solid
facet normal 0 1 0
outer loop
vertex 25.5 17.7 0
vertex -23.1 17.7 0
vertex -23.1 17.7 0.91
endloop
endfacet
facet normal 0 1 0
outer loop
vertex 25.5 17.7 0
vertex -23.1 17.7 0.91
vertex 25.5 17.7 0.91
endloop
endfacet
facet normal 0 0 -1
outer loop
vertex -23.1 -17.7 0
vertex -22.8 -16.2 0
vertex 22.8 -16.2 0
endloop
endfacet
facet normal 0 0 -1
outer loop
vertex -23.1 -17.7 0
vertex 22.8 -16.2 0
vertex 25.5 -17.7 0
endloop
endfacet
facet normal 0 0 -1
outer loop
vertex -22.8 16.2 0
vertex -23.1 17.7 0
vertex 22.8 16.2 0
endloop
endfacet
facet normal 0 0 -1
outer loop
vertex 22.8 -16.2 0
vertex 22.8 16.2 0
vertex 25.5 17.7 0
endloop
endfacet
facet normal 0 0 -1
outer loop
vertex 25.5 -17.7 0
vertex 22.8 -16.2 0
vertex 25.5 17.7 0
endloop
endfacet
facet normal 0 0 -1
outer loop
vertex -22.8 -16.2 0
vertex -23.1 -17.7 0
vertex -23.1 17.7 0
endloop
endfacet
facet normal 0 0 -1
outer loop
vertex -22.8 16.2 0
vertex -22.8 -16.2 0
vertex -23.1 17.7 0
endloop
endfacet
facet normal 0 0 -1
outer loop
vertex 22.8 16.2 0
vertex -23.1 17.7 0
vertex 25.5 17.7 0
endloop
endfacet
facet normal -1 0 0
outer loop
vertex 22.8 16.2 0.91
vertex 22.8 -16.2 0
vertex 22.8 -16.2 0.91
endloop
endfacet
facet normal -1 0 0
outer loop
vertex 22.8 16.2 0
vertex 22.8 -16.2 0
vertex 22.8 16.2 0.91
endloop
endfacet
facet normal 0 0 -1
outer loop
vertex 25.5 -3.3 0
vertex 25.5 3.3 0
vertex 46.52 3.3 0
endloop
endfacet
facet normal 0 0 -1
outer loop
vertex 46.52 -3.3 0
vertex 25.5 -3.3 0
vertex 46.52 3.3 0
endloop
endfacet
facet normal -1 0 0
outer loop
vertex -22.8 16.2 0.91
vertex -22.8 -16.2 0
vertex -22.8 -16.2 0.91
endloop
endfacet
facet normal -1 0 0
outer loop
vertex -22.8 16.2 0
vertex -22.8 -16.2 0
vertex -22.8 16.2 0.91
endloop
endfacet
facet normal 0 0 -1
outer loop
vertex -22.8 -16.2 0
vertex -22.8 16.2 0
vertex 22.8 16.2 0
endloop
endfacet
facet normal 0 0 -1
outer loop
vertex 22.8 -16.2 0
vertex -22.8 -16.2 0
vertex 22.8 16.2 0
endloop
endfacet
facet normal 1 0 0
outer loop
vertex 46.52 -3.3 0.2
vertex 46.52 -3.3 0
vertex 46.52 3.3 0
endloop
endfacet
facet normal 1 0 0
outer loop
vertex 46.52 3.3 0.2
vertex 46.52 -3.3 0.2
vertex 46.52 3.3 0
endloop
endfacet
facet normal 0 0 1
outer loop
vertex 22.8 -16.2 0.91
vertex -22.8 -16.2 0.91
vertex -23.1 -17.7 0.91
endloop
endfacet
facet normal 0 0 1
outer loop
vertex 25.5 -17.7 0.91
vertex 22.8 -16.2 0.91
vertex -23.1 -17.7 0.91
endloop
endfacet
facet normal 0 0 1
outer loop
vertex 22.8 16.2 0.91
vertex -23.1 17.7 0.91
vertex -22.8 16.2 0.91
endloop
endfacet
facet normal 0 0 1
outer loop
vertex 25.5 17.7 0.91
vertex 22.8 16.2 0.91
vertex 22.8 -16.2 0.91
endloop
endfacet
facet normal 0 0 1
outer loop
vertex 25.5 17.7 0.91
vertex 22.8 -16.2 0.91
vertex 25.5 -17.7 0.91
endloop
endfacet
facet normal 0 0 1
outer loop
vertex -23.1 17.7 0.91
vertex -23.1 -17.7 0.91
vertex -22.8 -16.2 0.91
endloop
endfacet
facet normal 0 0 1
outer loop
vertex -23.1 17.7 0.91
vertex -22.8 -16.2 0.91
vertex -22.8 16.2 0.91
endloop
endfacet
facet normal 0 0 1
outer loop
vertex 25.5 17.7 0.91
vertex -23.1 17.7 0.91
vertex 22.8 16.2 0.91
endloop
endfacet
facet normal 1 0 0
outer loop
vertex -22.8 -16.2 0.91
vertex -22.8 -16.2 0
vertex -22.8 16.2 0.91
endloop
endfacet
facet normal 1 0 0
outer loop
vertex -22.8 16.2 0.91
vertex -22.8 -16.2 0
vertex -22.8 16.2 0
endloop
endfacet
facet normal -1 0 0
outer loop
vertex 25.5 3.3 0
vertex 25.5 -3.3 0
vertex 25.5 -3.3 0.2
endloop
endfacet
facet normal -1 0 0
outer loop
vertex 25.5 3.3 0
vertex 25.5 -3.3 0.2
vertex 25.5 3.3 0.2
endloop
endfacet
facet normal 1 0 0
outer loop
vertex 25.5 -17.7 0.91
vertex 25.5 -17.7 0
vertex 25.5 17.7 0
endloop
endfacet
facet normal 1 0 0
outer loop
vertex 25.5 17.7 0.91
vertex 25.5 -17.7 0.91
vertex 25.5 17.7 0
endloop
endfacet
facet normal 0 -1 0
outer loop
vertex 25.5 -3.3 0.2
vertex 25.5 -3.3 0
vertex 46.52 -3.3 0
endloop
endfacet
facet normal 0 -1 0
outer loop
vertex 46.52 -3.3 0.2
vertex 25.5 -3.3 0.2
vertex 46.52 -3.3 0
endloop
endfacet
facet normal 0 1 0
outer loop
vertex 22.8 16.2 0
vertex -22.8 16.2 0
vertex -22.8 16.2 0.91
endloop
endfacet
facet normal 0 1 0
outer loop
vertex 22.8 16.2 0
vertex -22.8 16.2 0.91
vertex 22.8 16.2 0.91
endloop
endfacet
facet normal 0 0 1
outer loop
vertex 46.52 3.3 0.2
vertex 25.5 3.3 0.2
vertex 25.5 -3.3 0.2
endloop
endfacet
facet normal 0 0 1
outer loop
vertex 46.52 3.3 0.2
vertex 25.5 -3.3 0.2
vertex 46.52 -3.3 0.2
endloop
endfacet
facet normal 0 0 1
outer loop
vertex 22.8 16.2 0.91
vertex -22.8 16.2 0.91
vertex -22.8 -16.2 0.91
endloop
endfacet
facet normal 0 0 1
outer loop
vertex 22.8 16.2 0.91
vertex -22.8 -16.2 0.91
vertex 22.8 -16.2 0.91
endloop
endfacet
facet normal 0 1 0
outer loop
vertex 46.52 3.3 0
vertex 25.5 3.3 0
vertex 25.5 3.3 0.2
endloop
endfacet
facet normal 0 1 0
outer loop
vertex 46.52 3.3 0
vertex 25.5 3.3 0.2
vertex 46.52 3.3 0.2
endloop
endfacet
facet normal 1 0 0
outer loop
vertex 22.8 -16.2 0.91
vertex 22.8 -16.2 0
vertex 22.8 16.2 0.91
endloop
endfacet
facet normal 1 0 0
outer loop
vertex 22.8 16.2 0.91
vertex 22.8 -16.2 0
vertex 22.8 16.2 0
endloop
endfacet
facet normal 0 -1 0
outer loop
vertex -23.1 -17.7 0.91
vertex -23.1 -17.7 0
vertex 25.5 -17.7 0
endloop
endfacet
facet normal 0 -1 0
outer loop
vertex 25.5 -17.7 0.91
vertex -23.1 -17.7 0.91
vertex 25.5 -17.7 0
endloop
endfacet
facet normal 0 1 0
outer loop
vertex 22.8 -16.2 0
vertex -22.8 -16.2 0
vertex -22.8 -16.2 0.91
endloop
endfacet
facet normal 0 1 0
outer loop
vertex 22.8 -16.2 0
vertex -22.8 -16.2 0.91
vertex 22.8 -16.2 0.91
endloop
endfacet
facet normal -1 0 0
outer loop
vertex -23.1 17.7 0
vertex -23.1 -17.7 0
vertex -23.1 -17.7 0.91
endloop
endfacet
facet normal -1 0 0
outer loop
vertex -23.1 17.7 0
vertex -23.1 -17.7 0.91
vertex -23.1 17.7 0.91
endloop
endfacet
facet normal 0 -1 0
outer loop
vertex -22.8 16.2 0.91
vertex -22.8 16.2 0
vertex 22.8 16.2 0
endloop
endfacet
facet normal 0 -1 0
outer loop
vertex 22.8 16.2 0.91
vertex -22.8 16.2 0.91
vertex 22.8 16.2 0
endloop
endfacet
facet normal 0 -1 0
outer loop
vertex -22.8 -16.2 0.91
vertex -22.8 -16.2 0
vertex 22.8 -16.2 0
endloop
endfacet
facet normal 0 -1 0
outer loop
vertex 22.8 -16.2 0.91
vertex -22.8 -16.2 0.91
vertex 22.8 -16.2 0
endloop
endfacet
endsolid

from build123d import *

# Parameters (mm, degrees)
SKETCH1_W           = 45.6
SKETCH1_H           = 32.4
BOSS_EXTRUDE1_DEPTH = 0.91
SKETCH1_3_W         = 45.6
SKETCH1_3_H         = 32.4
BOSS_EXTRUDE2_DEPTH = 0.91
SKETCH1_4_W         = 21.02
SKETCH1_4_H         = 6.6
BOSS_EXTRUDE3_DEPTH = 0.2


with BuildPart() as part:
    # Sketch1 → Boss-Extrude1 (new body)
    with BuildSketch(Plane.XY):
        Rectangle(SKETCH1_W, SKETCH1_H)
    extrude(amount=BOSS_EXTRUDE1_DEPTH)


with BuildPart() as body_2:
    # Sketch1<3> → Boss-Extrude2 (new body)
    with BuildSketch(Plane.XY):
        Polygon((25.5, 3.3), (25.5, 17.7), (-23.1, 17.7), (-23.1, -17.7), (25.5, -17.7), (25.5, -3.3), align=None)
        Rectangle(SKETCH1_3_W, SKETCH1_3_H, mode=Mode.SUBTRACT)
    extrude(amount=BOSS_EXTRUDE2_DEPTH)


with BuildPart() as body_3:
    # Sketch1<4> → Boss-Extrude3 (new body)
    with BuildSketch(Plane.XY):
        with Locations((36.01, 0)):
            Rectangle(SKETCH1_4_W, SKETCH1_4_H)
    extrude(amount=BOSS_EXTRUDE3_DEPTH)


solid = Compound([part.part, body_2.part, body_3.part])
